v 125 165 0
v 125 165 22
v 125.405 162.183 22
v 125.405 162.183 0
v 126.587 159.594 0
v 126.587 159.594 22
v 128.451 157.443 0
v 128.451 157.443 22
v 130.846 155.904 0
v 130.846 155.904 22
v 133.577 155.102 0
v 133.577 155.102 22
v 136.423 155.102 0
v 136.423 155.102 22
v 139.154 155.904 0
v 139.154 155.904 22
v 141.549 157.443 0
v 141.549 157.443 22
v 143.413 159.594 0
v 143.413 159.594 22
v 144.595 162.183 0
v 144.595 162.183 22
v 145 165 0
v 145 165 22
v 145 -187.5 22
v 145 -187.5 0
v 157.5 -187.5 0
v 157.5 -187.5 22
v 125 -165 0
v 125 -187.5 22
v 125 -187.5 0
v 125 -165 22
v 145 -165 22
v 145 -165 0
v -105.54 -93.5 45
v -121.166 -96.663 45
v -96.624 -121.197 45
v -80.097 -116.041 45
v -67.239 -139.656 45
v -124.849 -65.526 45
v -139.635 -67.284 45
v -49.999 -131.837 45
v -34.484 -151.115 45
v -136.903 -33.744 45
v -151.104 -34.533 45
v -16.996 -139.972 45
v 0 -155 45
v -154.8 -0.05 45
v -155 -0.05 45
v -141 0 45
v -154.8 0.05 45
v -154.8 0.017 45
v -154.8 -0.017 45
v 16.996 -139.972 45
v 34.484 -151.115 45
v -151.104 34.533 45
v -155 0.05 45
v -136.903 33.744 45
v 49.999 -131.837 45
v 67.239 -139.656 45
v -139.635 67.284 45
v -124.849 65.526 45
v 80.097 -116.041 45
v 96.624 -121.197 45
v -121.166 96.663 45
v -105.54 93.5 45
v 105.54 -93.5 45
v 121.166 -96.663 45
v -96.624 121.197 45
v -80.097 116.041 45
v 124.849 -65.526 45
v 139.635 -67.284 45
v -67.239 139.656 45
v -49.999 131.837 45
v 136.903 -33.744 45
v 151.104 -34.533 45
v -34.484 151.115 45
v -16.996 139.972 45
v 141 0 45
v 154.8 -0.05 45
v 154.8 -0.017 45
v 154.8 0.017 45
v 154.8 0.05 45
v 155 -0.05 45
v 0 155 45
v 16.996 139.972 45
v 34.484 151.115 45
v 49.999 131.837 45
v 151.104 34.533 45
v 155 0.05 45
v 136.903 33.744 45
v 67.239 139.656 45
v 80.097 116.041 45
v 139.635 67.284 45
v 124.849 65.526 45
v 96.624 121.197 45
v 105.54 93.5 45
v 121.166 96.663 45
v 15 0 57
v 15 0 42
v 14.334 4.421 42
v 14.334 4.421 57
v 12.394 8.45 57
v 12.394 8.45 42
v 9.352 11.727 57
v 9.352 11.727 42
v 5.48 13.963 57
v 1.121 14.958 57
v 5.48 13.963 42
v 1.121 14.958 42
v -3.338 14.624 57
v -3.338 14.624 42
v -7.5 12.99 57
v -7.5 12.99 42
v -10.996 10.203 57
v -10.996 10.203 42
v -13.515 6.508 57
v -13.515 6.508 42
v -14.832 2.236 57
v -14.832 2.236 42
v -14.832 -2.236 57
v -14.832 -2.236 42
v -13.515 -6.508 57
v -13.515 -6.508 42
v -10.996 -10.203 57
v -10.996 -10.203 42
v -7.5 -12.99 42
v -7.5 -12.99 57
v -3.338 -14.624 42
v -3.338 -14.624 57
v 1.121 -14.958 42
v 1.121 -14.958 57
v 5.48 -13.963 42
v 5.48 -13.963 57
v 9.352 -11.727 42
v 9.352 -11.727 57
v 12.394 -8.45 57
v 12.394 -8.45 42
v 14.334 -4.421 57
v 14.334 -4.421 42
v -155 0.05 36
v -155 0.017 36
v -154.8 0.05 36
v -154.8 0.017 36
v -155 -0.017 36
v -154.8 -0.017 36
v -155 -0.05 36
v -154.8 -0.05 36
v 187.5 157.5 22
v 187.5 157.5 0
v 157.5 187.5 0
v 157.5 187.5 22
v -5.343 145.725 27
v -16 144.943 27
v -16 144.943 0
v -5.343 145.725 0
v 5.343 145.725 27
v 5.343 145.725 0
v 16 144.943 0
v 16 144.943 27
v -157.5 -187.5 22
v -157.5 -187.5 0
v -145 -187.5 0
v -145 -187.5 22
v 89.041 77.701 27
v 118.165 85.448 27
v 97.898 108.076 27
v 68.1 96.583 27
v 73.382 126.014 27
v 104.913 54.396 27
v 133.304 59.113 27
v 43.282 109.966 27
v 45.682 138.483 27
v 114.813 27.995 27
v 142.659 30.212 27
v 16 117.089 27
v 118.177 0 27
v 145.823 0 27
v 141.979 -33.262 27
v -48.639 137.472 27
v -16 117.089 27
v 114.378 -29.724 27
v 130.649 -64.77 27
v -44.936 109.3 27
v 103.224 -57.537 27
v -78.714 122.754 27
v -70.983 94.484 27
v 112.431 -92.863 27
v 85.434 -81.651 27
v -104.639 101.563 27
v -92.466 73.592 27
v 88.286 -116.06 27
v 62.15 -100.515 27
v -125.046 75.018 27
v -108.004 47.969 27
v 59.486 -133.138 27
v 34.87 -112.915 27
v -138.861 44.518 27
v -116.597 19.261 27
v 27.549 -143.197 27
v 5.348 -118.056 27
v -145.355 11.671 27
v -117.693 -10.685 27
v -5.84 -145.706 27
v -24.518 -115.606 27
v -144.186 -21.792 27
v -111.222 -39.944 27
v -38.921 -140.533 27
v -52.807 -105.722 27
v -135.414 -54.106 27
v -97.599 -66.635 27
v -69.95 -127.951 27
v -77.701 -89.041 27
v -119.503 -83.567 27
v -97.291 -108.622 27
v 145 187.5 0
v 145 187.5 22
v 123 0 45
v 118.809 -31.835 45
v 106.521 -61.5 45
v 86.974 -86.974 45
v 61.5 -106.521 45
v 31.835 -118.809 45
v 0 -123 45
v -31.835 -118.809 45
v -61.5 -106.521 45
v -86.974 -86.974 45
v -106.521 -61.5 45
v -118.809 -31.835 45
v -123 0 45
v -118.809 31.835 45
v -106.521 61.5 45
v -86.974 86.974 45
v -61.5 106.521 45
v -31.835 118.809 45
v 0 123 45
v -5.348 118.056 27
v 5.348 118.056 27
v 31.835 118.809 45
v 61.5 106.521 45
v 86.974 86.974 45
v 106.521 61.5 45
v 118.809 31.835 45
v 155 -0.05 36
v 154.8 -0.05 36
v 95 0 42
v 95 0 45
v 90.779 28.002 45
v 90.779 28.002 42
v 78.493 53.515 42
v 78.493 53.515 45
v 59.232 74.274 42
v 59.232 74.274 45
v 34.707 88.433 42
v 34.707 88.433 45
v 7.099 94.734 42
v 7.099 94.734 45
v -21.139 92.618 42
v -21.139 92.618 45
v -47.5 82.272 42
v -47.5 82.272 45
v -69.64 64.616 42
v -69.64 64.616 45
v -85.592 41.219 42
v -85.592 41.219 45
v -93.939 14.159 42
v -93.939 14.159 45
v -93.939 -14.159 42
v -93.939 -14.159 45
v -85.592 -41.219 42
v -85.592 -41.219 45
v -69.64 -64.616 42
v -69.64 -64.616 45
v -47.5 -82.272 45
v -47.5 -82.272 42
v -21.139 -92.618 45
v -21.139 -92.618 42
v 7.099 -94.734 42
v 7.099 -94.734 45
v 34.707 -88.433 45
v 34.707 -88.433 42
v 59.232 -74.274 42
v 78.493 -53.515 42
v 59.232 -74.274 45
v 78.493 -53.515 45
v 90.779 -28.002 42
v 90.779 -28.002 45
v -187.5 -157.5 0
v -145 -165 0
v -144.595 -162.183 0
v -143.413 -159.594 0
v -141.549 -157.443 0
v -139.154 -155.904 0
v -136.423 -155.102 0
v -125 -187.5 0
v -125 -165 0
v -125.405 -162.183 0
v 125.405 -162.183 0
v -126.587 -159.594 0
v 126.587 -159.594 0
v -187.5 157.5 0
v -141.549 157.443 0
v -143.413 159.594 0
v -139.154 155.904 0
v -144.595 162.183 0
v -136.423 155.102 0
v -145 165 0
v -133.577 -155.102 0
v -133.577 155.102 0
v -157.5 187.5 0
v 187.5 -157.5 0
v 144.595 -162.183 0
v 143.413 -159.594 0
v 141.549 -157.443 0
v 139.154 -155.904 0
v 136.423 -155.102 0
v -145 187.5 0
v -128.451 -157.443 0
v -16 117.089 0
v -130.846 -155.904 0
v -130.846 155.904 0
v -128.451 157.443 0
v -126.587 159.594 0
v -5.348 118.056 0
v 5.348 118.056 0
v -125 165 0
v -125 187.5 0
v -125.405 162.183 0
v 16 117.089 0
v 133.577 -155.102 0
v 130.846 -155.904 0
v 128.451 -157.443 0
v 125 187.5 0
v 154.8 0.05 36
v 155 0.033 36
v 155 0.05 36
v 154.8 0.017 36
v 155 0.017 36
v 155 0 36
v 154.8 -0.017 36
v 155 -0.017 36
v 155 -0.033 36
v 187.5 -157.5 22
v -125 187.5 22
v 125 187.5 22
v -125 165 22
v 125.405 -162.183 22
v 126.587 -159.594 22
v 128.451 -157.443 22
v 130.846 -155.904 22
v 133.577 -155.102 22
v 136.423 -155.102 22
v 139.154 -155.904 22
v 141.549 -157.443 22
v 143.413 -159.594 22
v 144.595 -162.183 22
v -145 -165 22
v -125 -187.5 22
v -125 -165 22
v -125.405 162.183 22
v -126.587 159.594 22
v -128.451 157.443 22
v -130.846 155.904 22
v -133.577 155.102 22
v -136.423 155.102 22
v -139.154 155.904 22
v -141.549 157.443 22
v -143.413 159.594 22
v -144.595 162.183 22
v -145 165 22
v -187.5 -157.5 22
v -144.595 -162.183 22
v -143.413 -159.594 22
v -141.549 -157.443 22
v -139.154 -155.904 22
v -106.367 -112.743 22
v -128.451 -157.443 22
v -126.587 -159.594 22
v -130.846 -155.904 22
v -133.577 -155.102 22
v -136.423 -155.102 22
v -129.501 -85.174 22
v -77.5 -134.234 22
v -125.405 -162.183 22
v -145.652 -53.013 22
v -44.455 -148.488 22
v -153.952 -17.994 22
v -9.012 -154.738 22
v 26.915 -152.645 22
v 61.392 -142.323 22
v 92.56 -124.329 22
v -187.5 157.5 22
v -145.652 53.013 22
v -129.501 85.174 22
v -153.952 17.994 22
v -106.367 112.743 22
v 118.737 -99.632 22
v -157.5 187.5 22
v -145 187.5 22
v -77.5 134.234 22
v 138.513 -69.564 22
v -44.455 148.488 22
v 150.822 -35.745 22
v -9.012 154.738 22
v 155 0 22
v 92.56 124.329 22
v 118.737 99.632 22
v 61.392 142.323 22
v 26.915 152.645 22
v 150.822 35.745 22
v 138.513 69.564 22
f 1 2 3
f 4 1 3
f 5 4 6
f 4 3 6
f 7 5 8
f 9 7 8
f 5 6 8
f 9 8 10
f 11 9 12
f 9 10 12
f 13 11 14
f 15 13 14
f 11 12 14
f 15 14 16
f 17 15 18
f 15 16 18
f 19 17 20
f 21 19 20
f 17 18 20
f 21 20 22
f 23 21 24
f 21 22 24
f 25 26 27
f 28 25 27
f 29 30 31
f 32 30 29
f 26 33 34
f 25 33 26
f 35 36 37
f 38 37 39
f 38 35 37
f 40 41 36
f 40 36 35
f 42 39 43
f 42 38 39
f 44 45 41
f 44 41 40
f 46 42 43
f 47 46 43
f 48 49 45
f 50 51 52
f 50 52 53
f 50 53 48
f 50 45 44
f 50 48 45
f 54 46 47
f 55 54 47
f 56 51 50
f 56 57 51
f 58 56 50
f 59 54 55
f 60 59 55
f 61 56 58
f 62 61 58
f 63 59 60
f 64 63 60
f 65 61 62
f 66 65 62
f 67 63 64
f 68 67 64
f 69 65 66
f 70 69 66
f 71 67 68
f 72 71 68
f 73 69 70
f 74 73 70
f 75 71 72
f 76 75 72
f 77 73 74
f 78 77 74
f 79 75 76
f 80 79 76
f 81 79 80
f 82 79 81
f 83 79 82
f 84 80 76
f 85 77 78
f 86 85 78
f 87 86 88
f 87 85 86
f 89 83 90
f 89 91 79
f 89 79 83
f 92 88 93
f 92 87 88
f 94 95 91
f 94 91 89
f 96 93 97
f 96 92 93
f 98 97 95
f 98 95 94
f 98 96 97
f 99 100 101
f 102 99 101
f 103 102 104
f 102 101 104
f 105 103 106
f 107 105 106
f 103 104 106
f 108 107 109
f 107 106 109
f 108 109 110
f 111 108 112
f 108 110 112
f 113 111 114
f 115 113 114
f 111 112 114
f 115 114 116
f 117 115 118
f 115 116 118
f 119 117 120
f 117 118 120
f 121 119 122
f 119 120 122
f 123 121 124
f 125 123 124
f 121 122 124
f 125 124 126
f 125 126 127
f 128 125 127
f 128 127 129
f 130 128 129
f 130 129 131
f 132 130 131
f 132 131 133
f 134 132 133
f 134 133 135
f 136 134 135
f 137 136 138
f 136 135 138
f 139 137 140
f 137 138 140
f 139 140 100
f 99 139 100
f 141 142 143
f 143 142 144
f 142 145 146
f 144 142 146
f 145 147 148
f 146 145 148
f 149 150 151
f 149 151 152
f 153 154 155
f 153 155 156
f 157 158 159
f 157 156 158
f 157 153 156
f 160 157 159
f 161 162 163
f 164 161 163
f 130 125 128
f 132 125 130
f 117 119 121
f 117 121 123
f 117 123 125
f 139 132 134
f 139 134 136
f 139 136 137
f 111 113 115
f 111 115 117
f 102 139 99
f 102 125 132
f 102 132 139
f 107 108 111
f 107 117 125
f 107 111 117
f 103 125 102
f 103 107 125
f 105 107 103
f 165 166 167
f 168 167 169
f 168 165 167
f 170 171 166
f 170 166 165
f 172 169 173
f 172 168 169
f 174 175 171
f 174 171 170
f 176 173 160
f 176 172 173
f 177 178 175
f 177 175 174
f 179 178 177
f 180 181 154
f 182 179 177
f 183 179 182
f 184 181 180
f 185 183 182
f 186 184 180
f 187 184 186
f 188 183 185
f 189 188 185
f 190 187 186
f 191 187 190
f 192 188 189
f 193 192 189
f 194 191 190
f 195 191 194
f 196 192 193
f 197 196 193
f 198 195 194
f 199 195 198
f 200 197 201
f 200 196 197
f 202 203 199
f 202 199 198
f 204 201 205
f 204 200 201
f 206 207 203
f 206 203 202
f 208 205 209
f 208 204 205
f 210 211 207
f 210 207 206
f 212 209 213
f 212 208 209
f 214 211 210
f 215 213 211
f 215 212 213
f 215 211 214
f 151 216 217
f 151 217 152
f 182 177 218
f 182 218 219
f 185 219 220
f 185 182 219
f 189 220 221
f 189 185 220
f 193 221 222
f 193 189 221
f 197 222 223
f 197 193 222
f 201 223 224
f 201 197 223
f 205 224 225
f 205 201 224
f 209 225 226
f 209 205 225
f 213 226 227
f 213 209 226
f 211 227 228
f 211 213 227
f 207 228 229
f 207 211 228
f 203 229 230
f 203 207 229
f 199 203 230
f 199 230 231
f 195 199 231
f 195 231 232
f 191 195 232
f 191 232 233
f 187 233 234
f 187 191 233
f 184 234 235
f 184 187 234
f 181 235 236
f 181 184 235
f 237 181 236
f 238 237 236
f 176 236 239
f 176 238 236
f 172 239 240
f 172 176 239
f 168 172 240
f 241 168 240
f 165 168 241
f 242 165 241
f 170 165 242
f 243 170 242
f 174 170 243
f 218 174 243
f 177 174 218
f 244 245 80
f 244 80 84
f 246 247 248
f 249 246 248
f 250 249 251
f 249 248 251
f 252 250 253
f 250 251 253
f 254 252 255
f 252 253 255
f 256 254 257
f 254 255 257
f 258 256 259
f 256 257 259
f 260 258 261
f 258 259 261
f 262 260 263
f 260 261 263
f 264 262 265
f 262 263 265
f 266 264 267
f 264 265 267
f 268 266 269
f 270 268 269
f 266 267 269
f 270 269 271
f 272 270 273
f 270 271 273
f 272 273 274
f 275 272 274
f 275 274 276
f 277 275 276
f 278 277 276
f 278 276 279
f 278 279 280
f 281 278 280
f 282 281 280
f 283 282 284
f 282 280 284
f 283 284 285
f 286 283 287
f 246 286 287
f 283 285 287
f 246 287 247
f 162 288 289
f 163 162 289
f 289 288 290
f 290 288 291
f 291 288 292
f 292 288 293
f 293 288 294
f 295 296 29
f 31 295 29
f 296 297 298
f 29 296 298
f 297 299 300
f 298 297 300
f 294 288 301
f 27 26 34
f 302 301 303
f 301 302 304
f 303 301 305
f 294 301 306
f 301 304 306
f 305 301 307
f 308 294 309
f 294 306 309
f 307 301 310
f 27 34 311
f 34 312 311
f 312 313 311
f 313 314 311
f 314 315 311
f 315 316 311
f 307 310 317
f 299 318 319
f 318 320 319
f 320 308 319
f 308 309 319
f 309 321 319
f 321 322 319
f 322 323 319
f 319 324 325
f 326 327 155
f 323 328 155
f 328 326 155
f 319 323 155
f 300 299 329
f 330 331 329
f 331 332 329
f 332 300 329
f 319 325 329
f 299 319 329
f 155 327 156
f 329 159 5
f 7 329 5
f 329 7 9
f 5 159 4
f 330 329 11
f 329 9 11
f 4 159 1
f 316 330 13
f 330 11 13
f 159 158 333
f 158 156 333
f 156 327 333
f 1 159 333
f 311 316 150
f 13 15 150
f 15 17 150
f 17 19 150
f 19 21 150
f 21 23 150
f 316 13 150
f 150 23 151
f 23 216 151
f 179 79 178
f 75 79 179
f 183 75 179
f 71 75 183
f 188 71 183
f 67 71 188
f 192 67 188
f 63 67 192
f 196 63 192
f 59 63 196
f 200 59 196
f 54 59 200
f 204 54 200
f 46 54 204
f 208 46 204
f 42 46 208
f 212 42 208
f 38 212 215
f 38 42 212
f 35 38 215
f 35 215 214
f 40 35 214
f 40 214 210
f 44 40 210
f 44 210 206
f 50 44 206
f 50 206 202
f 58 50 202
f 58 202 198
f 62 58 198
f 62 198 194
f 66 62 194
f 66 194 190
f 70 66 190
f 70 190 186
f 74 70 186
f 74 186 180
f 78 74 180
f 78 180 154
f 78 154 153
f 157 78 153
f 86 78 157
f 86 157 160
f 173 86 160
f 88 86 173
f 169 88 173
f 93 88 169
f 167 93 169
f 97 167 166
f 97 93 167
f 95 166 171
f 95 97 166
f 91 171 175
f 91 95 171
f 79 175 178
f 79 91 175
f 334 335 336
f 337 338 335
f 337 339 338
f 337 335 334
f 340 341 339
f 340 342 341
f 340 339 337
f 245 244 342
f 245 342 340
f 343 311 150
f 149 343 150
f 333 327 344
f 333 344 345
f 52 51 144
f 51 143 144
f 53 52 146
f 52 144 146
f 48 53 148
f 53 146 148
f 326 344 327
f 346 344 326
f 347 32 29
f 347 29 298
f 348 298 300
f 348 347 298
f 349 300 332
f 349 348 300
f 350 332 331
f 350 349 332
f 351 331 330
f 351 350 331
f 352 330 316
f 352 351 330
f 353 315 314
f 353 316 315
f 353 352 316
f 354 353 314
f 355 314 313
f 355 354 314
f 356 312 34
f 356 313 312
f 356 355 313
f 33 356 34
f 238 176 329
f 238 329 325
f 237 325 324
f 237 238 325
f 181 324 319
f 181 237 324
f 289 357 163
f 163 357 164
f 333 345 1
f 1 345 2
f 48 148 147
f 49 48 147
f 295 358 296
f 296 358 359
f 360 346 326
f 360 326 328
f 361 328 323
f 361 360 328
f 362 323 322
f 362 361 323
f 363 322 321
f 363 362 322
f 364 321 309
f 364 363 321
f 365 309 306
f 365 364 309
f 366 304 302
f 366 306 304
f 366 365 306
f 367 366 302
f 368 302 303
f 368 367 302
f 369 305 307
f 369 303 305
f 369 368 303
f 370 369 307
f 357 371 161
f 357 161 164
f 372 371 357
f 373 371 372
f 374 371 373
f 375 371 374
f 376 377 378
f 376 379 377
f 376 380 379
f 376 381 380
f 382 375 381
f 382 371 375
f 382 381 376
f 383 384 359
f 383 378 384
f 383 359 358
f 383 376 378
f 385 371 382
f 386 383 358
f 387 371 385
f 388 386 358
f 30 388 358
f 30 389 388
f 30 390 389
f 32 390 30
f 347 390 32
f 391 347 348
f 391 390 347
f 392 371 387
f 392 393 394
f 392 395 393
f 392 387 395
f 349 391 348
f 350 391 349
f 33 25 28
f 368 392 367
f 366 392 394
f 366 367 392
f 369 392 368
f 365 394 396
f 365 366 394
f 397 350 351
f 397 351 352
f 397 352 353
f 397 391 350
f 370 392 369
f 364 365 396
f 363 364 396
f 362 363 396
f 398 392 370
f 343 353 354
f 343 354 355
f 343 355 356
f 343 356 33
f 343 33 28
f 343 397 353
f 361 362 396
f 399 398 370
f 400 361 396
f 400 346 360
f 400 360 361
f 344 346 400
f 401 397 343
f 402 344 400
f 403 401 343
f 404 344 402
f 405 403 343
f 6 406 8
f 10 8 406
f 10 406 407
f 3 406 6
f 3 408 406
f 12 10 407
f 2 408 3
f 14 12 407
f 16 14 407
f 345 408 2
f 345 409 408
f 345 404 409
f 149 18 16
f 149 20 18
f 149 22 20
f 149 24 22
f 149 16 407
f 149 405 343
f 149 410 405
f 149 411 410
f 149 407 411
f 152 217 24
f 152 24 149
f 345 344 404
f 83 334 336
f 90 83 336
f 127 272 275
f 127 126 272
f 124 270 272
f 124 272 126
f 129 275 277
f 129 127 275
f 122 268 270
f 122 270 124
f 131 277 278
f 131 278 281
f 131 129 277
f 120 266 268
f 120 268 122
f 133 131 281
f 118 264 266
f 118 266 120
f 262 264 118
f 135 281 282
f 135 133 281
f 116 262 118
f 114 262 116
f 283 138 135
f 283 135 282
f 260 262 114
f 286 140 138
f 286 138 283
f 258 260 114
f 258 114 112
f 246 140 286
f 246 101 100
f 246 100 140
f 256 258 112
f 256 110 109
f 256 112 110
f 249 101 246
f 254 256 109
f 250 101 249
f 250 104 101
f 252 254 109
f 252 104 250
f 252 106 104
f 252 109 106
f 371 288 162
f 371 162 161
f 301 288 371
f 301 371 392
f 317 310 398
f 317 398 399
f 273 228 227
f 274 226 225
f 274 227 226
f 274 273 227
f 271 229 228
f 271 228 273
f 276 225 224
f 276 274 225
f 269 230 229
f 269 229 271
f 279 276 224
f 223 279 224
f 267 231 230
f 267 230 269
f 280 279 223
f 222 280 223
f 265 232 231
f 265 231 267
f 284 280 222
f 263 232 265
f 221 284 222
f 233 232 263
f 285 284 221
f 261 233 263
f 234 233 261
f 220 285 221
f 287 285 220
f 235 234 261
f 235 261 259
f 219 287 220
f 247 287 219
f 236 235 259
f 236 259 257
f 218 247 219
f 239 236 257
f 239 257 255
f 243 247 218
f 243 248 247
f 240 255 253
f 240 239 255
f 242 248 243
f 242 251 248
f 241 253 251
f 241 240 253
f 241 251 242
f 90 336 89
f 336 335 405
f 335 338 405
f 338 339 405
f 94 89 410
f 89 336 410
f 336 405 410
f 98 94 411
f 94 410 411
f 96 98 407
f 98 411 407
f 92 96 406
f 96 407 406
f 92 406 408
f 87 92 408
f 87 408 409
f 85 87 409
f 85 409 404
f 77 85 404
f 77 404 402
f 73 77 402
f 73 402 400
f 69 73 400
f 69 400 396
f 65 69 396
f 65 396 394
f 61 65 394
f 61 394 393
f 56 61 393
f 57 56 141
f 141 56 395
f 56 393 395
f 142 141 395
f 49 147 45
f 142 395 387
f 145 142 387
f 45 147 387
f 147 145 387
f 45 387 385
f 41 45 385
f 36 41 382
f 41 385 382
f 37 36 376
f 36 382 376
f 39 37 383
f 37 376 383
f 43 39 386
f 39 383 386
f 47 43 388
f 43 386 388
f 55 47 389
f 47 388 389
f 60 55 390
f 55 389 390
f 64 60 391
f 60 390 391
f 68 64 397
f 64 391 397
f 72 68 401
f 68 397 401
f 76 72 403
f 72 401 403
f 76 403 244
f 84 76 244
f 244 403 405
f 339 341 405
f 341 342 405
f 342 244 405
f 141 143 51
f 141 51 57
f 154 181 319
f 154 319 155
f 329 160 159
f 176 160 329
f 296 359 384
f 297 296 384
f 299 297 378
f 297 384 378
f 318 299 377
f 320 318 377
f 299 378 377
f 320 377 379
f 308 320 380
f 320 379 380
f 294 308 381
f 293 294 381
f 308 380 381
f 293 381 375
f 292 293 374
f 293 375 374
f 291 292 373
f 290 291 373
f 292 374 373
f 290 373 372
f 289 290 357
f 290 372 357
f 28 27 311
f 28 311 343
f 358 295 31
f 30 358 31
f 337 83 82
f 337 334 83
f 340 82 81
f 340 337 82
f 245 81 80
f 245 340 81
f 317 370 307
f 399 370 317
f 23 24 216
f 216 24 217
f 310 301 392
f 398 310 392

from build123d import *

# Parameters (mm, degrees)
SKETCH_1_W                                = 375
SKETCH_1_H                                = 375
EXTRUDE_1_DEPTH                           = 22
CHAMFER_1_SIZE                            = 30
CUT_EXTRUDE_1_DEPTH                       = 267.076116929
MIRROR_1_AT_THE_SECOND_PLANE_COPY_1_DEPTH = 267.076116929
SKETCH_3_R                                = 155
EXTRUDE_2_DEPTH                           = 23
SKETCH_4_R                                = 95
CUT_EXTRUDE_2_DEPTH                       = 3
SKETCH_5_R                                = 15
EXTRUDE_3_DEPTH                           = 15
CUT_EXTRUDE_3_DEPTH                       = 267.85670312
WRAP_1_SECTION_W                          = 0.2
WRAP_1_SECTION_H                          = 9
WRAP_1_ANGLE                              = 0.036965019


with BuildPart() as part:
    # 草图1 → 凸台-拉伸1 (new body)
    with BuildSketch(Plane.XY):
        Rectangle(SKETCH_1_W, SKETCH_1_H)
    extrude(amount=EXTRUDE_1_DEPTH)

    # 倒角1
    chamfer_1_edges = [part.edges().sort_by_distance(p)[0] for p in [
        (187.5, -187.5, 11),
        (-187.5, -187.5, 11),
        (-187.5, 187.5, 11),
        (187.5, 187.5, 11),
    ]]
    chamfer(chamfer_1_edges, length=CHAMFER_1_SIZE)

    # 草图2 → 切除-拉伸1 (cut, through all)
    with BuildSketch(Plane.XY.offset(22)):
        with BuildLine():
            Line((125, -187.5), (125, -165))
            ThreePointArc((125, -165), (135, -155), (145, -165))
            Line((145, -165), (145, -187.5))
            ThreePointArc((145, -187.5), (135, -197.5), (125, -187.5))
        make_face()
    cut_extrude_1 = extrude(amount=-CUT_EXTRUDE_1_DEPTH, mode=Mode.SUBTRACT)

    # 镜向1: 切除-拉伸1 across plane
    add(cut_extrude_1.mirror(Plane.ZX), mode=Mode.SUBTRACT)

    # 镜向1 at the second plane: 切除-拉伸1 across plane
    add(cut_extrude_1.mirror(Plane(origin=(0, 0, 0), x_dir=(0, 0, 1), z_dir=(1, 0, 0))), mode=Mode.SUBTRACT)

    # 镜向1 at the second plane copy 1 sket → 镜向1 at the second plane copy 1 (cut, through all)
    with BuildSketch(Plane(origin=(0, 0, 22), x_dir=(-1, 0, 0), z_dir=(0, 0, 1))):
        with BuildLine():
            Line((125, -187.5), (125, -165))
            ThreePointArc((125, -165), (135, -155), (145, -165))
            Line((145, -165), (145, -187.5))
            ThreePointArc((145, -187.5), (135, -197.5), (125, -187.5))
        make_face()
    extrude(amount=-MIRROR_1_AT_THE_SECOND_PLANE_COPY_1_DEPTH, mode=Mode.SUBTRACT)

    # 草图3 → 凸台-拉伸2 (add)
    with BuildSketch(Plane.XY.offset(22)):
        Circle(SKETCH_3_R)
    extrude(amount=EXTRUDE_2_DEPTH)

    # 草图4 → 切除-拉伸2 (cut)
    with BuildSketch(Plane.XY.offset(45)):
        Circle(SKETCH_4_R)
    extrude(amount=-CUT_EXTRUDE_2_DEPTH, mode=Mode.SUBTRACT)

    # 草图5 → 凸台-拉伸3 (add)
    with BuildSketch(Plane.XY.offset(42)):
        Circle(SKETCH_5_R)
    extrude(amount=EXTRUDE_3_DEPTH)

    # 草图6 → 切除-旋转1 (revolve, cut)
    with BuildSketch(Plane(origin=(0, 0, 0), x_dir=(0, 0, -1), z_dir=(1, 0, 0)), mode=Mode.PRIVATE) as cut_revolve_1_sk:
        Polygon((-78.588457268, -132), (-27, -118.176914536), (-27, -145.823085464), align=None)
    revolve(cut_revolve_1_sk.sketch.rotate(Axis((0, 0, 0), (0, 0, -1)), 270), axis=Axis((0, 0, 0), (0, 0, -1)), mode=Mode.SUBTRACT)

    # 草图7 → 切除-拉伸3 (cut, through all)
    with BuildSketch(Plane.XY.offset(27)):
        with BuildLine():
            Line((-16, 117.088783106), (-16, 144.942651605))
            ThreePointArc((-16, 144.942651605), (0, 145.823085464), (16, 144.942651605))
            Line((16, 144.942651605), (16, 117.088783106))
            ThreePointArc((16, 117.088783106), (0, 118.176914536), (-16, 117.088783106))
        make_face()
    extrude(amount=-CUT_EXTRUDE_3_DEPTH, mode=Mode.SUBTRACT)

    # 包覆1 section (on wrap section) → 包覆1 (revolve, cut)
    with BuildSketch(Plane(origin=(0, 0, 22), x_dir=(0.9999999479708641, 0.00032258063956674645, 0), z_dir=(-0.00032258063956674645, 0.9999999479708641, 0))):
        with Locations((154.9, -18.5)):
            Rectangle(WRAP_1_SECTION_W, WRAP_1_SECTION_H)
    wrap_1 = revolve(axis=Axis((0, 0, 22), (0, 0, -1)), revolution_arc=WRAP_1_ANGLE, mode=Mode.SUBTRACT)

    # 镜向2: 包覆1 across plane
    add(wrap_1.mirror(Plane(origin=(0, 0, 0), x_dir=(0, 0, 1), z_dir=(1, 0, 0))), mode=Mode.SUBTRACT)


solid = part.part
